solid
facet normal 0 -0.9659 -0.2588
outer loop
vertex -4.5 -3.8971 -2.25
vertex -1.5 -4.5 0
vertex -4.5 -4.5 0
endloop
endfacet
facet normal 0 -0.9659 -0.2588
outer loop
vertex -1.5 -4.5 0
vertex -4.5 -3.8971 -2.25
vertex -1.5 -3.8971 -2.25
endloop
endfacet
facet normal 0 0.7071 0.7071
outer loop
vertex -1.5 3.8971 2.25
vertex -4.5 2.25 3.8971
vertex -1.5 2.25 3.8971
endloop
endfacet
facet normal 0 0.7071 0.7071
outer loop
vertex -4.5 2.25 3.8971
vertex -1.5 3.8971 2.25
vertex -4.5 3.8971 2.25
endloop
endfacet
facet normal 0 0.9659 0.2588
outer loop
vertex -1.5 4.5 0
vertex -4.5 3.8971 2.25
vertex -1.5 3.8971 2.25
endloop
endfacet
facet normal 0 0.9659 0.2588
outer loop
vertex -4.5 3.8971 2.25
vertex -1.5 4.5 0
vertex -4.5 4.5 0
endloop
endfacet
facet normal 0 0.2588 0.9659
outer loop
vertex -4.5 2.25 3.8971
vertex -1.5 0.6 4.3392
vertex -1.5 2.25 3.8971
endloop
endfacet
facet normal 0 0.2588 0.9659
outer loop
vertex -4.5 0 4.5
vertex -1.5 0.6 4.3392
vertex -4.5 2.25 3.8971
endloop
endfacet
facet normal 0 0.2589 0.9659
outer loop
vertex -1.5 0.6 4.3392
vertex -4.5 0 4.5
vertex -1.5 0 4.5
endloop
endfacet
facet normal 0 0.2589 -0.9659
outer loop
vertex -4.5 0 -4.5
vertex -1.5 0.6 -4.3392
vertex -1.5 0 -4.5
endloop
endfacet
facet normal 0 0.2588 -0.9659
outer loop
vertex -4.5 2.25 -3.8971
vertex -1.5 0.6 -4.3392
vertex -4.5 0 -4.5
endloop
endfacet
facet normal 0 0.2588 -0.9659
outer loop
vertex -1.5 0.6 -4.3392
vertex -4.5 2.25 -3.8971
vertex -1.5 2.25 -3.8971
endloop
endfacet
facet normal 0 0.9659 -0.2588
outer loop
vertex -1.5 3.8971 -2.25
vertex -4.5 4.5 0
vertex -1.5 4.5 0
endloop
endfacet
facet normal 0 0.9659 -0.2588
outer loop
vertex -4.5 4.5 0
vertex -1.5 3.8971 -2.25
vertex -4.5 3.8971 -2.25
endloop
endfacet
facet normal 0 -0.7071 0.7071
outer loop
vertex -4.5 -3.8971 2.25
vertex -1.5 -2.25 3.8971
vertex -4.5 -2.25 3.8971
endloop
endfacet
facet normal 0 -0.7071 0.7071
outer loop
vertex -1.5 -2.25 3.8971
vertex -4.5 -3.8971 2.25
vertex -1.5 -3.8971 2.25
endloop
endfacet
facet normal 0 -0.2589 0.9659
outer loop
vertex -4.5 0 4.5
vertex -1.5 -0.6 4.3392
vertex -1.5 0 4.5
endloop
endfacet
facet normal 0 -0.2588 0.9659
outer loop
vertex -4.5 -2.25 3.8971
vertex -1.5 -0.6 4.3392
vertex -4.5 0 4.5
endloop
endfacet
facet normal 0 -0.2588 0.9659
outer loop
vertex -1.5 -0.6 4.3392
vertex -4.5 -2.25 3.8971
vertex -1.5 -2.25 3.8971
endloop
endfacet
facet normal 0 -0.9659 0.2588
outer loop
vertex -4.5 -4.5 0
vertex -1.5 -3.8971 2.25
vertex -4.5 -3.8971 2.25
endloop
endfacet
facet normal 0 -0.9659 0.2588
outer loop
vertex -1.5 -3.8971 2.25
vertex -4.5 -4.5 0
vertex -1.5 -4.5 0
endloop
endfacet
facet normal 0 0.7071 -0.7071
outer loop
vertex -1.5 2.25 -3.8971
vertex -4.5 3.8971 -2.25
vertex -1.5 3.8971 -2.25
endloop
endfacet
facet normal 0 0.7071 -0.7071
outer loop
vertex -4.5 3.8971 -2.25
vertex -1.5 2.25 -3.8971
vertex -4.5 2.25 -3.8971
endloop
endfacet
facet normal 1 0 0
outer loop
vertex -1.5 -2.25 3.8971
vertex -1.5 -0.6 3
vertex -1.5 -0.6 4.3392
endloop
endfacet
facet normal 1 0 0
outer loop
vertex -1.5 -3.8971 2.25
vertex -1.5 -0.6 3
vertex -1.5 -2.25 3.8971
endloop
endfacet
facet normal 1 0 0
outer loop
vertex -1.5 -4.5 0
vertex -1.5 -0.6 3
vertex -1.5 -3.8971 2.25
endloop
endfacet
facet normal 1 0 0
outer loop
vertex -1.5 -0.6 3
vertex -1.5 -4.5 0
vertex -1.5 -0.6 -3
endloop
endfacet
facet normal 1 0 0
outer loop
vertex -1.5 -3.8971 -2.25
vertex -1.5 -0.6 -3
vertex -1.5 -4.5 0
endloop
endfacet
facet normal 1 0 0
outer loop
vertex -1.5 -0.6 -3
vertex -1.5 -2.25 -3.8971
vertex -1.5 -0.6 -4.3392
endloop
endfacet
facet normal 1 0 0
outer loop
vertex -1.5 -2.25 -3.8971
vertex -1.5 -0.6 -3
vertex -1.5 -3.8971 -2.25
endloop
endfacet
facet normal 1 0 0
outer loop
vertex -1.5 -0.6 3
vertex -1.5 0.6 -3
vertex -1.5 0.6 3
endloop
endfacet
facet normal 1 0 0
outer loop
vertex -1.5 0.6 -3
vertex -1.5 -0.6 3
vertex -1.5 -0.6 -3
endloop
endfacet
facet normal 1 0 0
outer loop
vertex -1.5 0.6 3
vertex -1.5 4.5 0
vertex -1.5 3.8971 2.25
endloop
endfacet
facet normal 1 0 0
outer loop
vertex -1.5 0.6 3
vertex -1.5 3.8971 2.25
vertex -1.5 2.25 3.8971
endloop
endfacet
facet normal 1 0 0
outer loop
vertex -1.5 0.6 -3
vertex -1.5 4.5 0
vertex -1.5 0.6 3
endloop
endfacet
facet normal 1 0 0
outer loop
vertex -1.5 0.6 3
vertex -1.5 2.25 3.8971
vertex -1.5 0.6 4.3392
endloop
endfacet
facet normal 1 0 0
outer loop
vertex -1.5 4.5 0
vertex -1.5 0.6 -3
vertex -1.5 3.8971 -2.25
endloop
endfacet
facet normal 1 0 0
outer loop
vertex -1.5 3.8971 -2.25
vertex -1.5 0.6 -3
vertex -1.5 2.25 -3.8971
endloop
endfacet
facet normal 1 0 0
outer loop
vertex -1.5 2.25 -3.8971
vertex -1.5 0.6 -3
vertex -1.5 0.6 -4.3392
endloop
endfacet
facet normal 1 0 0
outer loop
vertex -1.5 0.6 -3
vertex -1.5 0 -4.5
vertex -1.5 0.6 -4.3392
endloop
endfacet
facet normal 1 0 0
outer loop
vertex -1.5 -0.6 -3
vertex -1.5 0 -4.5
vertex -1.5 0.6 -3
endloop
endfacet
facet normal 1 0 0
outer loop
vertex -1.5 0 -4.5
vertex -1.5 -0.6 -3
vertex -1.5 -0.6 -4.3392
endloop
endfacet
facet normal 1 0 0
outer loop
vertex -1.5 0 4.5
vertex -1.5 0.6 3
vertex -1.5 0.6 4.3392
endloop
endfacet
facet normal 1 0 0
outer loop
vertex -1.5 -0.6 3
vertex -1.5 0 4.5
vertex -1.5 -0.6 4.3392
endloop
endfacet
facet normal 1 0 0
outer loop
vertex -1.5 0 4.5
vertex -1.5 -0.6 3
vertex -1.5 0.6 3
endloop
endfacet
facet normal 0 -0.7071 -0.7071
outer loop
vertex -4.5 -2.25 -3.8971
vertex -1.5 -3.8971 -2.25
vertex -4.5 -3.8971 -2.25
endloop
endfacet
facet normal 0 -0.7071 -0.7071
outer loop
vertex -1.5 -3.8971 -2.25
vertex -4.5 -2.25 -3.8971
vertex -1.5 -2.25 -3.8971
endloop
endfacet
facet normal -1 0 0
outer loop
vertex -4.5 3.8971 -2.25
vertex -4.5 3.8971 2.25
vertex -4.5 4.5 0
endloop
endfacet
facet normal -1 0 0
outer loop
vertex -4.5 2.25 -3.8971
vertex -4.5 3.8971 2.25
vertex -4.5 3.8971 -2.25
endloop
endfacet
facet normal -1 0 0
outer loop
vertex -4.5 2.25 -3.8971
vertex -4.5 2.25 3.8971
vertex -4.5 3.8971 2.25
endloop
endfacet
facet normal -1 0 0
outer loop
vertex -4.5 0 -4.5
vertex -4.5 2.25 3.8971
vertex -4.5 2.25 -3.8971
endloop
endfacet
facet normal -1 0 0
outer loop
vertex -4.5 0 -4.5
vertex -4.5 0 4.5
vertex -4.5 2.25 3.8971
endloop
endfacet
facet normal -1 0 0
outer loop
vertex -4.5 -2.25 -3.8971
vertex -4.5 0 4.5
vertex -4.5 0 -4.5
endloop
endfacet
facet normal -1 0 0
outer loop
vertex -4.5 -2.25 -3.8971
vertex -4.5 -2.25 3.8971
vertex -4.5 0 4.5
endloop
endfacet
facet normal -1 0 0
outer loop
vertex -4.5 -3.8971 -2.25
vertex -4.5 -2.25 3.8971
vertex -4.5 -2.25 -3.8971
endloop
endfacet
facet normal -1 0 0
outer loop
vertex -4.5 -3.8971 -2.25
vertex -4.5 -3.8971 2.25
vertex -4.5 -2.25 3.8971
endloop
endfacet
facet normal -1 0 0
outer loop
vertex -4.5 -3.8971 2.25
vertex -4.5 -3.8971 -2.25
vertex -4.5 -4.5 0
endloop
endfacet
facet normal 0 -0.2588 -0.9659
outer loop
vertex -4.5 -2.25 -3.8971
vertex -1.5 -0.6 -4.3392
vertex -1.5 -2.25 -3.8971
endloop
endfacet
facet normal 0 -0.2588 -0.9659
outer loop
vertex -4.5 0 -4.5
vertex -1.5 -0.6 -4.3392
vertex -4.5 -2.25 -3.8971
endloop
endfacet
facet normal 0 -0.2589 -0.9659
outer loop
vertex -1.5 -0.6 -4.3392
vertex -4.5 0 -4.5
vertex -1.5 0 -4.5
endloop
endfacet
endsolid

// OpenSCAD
module c_shaped_clamp() {
    difference() {
        // Outer faceted arc
        rotate([0, 90, 0])
        rotate([0, 0, 90])
        translate([0, 0, -4.5])
        cylinder(r1=4.5, r2=4.5, h=3, $fn=12);

        // Inner concave channel
        translate([0, 0, -4.5])
        rotate([0, 90, 0])
        rotate([0, 0, 90])
        cylinder(r1=3.5, r2=3.5, h=3, $fn=64);

        // End tabs
        translate([-1.5, -0.6, -4.5])
        cube([3, 1.2, 1.5]);

        translate([-1.5, -0.6, 3])
        cube([3, 1.2, 1.5]);
    }
}

c_shaped_clamp();
